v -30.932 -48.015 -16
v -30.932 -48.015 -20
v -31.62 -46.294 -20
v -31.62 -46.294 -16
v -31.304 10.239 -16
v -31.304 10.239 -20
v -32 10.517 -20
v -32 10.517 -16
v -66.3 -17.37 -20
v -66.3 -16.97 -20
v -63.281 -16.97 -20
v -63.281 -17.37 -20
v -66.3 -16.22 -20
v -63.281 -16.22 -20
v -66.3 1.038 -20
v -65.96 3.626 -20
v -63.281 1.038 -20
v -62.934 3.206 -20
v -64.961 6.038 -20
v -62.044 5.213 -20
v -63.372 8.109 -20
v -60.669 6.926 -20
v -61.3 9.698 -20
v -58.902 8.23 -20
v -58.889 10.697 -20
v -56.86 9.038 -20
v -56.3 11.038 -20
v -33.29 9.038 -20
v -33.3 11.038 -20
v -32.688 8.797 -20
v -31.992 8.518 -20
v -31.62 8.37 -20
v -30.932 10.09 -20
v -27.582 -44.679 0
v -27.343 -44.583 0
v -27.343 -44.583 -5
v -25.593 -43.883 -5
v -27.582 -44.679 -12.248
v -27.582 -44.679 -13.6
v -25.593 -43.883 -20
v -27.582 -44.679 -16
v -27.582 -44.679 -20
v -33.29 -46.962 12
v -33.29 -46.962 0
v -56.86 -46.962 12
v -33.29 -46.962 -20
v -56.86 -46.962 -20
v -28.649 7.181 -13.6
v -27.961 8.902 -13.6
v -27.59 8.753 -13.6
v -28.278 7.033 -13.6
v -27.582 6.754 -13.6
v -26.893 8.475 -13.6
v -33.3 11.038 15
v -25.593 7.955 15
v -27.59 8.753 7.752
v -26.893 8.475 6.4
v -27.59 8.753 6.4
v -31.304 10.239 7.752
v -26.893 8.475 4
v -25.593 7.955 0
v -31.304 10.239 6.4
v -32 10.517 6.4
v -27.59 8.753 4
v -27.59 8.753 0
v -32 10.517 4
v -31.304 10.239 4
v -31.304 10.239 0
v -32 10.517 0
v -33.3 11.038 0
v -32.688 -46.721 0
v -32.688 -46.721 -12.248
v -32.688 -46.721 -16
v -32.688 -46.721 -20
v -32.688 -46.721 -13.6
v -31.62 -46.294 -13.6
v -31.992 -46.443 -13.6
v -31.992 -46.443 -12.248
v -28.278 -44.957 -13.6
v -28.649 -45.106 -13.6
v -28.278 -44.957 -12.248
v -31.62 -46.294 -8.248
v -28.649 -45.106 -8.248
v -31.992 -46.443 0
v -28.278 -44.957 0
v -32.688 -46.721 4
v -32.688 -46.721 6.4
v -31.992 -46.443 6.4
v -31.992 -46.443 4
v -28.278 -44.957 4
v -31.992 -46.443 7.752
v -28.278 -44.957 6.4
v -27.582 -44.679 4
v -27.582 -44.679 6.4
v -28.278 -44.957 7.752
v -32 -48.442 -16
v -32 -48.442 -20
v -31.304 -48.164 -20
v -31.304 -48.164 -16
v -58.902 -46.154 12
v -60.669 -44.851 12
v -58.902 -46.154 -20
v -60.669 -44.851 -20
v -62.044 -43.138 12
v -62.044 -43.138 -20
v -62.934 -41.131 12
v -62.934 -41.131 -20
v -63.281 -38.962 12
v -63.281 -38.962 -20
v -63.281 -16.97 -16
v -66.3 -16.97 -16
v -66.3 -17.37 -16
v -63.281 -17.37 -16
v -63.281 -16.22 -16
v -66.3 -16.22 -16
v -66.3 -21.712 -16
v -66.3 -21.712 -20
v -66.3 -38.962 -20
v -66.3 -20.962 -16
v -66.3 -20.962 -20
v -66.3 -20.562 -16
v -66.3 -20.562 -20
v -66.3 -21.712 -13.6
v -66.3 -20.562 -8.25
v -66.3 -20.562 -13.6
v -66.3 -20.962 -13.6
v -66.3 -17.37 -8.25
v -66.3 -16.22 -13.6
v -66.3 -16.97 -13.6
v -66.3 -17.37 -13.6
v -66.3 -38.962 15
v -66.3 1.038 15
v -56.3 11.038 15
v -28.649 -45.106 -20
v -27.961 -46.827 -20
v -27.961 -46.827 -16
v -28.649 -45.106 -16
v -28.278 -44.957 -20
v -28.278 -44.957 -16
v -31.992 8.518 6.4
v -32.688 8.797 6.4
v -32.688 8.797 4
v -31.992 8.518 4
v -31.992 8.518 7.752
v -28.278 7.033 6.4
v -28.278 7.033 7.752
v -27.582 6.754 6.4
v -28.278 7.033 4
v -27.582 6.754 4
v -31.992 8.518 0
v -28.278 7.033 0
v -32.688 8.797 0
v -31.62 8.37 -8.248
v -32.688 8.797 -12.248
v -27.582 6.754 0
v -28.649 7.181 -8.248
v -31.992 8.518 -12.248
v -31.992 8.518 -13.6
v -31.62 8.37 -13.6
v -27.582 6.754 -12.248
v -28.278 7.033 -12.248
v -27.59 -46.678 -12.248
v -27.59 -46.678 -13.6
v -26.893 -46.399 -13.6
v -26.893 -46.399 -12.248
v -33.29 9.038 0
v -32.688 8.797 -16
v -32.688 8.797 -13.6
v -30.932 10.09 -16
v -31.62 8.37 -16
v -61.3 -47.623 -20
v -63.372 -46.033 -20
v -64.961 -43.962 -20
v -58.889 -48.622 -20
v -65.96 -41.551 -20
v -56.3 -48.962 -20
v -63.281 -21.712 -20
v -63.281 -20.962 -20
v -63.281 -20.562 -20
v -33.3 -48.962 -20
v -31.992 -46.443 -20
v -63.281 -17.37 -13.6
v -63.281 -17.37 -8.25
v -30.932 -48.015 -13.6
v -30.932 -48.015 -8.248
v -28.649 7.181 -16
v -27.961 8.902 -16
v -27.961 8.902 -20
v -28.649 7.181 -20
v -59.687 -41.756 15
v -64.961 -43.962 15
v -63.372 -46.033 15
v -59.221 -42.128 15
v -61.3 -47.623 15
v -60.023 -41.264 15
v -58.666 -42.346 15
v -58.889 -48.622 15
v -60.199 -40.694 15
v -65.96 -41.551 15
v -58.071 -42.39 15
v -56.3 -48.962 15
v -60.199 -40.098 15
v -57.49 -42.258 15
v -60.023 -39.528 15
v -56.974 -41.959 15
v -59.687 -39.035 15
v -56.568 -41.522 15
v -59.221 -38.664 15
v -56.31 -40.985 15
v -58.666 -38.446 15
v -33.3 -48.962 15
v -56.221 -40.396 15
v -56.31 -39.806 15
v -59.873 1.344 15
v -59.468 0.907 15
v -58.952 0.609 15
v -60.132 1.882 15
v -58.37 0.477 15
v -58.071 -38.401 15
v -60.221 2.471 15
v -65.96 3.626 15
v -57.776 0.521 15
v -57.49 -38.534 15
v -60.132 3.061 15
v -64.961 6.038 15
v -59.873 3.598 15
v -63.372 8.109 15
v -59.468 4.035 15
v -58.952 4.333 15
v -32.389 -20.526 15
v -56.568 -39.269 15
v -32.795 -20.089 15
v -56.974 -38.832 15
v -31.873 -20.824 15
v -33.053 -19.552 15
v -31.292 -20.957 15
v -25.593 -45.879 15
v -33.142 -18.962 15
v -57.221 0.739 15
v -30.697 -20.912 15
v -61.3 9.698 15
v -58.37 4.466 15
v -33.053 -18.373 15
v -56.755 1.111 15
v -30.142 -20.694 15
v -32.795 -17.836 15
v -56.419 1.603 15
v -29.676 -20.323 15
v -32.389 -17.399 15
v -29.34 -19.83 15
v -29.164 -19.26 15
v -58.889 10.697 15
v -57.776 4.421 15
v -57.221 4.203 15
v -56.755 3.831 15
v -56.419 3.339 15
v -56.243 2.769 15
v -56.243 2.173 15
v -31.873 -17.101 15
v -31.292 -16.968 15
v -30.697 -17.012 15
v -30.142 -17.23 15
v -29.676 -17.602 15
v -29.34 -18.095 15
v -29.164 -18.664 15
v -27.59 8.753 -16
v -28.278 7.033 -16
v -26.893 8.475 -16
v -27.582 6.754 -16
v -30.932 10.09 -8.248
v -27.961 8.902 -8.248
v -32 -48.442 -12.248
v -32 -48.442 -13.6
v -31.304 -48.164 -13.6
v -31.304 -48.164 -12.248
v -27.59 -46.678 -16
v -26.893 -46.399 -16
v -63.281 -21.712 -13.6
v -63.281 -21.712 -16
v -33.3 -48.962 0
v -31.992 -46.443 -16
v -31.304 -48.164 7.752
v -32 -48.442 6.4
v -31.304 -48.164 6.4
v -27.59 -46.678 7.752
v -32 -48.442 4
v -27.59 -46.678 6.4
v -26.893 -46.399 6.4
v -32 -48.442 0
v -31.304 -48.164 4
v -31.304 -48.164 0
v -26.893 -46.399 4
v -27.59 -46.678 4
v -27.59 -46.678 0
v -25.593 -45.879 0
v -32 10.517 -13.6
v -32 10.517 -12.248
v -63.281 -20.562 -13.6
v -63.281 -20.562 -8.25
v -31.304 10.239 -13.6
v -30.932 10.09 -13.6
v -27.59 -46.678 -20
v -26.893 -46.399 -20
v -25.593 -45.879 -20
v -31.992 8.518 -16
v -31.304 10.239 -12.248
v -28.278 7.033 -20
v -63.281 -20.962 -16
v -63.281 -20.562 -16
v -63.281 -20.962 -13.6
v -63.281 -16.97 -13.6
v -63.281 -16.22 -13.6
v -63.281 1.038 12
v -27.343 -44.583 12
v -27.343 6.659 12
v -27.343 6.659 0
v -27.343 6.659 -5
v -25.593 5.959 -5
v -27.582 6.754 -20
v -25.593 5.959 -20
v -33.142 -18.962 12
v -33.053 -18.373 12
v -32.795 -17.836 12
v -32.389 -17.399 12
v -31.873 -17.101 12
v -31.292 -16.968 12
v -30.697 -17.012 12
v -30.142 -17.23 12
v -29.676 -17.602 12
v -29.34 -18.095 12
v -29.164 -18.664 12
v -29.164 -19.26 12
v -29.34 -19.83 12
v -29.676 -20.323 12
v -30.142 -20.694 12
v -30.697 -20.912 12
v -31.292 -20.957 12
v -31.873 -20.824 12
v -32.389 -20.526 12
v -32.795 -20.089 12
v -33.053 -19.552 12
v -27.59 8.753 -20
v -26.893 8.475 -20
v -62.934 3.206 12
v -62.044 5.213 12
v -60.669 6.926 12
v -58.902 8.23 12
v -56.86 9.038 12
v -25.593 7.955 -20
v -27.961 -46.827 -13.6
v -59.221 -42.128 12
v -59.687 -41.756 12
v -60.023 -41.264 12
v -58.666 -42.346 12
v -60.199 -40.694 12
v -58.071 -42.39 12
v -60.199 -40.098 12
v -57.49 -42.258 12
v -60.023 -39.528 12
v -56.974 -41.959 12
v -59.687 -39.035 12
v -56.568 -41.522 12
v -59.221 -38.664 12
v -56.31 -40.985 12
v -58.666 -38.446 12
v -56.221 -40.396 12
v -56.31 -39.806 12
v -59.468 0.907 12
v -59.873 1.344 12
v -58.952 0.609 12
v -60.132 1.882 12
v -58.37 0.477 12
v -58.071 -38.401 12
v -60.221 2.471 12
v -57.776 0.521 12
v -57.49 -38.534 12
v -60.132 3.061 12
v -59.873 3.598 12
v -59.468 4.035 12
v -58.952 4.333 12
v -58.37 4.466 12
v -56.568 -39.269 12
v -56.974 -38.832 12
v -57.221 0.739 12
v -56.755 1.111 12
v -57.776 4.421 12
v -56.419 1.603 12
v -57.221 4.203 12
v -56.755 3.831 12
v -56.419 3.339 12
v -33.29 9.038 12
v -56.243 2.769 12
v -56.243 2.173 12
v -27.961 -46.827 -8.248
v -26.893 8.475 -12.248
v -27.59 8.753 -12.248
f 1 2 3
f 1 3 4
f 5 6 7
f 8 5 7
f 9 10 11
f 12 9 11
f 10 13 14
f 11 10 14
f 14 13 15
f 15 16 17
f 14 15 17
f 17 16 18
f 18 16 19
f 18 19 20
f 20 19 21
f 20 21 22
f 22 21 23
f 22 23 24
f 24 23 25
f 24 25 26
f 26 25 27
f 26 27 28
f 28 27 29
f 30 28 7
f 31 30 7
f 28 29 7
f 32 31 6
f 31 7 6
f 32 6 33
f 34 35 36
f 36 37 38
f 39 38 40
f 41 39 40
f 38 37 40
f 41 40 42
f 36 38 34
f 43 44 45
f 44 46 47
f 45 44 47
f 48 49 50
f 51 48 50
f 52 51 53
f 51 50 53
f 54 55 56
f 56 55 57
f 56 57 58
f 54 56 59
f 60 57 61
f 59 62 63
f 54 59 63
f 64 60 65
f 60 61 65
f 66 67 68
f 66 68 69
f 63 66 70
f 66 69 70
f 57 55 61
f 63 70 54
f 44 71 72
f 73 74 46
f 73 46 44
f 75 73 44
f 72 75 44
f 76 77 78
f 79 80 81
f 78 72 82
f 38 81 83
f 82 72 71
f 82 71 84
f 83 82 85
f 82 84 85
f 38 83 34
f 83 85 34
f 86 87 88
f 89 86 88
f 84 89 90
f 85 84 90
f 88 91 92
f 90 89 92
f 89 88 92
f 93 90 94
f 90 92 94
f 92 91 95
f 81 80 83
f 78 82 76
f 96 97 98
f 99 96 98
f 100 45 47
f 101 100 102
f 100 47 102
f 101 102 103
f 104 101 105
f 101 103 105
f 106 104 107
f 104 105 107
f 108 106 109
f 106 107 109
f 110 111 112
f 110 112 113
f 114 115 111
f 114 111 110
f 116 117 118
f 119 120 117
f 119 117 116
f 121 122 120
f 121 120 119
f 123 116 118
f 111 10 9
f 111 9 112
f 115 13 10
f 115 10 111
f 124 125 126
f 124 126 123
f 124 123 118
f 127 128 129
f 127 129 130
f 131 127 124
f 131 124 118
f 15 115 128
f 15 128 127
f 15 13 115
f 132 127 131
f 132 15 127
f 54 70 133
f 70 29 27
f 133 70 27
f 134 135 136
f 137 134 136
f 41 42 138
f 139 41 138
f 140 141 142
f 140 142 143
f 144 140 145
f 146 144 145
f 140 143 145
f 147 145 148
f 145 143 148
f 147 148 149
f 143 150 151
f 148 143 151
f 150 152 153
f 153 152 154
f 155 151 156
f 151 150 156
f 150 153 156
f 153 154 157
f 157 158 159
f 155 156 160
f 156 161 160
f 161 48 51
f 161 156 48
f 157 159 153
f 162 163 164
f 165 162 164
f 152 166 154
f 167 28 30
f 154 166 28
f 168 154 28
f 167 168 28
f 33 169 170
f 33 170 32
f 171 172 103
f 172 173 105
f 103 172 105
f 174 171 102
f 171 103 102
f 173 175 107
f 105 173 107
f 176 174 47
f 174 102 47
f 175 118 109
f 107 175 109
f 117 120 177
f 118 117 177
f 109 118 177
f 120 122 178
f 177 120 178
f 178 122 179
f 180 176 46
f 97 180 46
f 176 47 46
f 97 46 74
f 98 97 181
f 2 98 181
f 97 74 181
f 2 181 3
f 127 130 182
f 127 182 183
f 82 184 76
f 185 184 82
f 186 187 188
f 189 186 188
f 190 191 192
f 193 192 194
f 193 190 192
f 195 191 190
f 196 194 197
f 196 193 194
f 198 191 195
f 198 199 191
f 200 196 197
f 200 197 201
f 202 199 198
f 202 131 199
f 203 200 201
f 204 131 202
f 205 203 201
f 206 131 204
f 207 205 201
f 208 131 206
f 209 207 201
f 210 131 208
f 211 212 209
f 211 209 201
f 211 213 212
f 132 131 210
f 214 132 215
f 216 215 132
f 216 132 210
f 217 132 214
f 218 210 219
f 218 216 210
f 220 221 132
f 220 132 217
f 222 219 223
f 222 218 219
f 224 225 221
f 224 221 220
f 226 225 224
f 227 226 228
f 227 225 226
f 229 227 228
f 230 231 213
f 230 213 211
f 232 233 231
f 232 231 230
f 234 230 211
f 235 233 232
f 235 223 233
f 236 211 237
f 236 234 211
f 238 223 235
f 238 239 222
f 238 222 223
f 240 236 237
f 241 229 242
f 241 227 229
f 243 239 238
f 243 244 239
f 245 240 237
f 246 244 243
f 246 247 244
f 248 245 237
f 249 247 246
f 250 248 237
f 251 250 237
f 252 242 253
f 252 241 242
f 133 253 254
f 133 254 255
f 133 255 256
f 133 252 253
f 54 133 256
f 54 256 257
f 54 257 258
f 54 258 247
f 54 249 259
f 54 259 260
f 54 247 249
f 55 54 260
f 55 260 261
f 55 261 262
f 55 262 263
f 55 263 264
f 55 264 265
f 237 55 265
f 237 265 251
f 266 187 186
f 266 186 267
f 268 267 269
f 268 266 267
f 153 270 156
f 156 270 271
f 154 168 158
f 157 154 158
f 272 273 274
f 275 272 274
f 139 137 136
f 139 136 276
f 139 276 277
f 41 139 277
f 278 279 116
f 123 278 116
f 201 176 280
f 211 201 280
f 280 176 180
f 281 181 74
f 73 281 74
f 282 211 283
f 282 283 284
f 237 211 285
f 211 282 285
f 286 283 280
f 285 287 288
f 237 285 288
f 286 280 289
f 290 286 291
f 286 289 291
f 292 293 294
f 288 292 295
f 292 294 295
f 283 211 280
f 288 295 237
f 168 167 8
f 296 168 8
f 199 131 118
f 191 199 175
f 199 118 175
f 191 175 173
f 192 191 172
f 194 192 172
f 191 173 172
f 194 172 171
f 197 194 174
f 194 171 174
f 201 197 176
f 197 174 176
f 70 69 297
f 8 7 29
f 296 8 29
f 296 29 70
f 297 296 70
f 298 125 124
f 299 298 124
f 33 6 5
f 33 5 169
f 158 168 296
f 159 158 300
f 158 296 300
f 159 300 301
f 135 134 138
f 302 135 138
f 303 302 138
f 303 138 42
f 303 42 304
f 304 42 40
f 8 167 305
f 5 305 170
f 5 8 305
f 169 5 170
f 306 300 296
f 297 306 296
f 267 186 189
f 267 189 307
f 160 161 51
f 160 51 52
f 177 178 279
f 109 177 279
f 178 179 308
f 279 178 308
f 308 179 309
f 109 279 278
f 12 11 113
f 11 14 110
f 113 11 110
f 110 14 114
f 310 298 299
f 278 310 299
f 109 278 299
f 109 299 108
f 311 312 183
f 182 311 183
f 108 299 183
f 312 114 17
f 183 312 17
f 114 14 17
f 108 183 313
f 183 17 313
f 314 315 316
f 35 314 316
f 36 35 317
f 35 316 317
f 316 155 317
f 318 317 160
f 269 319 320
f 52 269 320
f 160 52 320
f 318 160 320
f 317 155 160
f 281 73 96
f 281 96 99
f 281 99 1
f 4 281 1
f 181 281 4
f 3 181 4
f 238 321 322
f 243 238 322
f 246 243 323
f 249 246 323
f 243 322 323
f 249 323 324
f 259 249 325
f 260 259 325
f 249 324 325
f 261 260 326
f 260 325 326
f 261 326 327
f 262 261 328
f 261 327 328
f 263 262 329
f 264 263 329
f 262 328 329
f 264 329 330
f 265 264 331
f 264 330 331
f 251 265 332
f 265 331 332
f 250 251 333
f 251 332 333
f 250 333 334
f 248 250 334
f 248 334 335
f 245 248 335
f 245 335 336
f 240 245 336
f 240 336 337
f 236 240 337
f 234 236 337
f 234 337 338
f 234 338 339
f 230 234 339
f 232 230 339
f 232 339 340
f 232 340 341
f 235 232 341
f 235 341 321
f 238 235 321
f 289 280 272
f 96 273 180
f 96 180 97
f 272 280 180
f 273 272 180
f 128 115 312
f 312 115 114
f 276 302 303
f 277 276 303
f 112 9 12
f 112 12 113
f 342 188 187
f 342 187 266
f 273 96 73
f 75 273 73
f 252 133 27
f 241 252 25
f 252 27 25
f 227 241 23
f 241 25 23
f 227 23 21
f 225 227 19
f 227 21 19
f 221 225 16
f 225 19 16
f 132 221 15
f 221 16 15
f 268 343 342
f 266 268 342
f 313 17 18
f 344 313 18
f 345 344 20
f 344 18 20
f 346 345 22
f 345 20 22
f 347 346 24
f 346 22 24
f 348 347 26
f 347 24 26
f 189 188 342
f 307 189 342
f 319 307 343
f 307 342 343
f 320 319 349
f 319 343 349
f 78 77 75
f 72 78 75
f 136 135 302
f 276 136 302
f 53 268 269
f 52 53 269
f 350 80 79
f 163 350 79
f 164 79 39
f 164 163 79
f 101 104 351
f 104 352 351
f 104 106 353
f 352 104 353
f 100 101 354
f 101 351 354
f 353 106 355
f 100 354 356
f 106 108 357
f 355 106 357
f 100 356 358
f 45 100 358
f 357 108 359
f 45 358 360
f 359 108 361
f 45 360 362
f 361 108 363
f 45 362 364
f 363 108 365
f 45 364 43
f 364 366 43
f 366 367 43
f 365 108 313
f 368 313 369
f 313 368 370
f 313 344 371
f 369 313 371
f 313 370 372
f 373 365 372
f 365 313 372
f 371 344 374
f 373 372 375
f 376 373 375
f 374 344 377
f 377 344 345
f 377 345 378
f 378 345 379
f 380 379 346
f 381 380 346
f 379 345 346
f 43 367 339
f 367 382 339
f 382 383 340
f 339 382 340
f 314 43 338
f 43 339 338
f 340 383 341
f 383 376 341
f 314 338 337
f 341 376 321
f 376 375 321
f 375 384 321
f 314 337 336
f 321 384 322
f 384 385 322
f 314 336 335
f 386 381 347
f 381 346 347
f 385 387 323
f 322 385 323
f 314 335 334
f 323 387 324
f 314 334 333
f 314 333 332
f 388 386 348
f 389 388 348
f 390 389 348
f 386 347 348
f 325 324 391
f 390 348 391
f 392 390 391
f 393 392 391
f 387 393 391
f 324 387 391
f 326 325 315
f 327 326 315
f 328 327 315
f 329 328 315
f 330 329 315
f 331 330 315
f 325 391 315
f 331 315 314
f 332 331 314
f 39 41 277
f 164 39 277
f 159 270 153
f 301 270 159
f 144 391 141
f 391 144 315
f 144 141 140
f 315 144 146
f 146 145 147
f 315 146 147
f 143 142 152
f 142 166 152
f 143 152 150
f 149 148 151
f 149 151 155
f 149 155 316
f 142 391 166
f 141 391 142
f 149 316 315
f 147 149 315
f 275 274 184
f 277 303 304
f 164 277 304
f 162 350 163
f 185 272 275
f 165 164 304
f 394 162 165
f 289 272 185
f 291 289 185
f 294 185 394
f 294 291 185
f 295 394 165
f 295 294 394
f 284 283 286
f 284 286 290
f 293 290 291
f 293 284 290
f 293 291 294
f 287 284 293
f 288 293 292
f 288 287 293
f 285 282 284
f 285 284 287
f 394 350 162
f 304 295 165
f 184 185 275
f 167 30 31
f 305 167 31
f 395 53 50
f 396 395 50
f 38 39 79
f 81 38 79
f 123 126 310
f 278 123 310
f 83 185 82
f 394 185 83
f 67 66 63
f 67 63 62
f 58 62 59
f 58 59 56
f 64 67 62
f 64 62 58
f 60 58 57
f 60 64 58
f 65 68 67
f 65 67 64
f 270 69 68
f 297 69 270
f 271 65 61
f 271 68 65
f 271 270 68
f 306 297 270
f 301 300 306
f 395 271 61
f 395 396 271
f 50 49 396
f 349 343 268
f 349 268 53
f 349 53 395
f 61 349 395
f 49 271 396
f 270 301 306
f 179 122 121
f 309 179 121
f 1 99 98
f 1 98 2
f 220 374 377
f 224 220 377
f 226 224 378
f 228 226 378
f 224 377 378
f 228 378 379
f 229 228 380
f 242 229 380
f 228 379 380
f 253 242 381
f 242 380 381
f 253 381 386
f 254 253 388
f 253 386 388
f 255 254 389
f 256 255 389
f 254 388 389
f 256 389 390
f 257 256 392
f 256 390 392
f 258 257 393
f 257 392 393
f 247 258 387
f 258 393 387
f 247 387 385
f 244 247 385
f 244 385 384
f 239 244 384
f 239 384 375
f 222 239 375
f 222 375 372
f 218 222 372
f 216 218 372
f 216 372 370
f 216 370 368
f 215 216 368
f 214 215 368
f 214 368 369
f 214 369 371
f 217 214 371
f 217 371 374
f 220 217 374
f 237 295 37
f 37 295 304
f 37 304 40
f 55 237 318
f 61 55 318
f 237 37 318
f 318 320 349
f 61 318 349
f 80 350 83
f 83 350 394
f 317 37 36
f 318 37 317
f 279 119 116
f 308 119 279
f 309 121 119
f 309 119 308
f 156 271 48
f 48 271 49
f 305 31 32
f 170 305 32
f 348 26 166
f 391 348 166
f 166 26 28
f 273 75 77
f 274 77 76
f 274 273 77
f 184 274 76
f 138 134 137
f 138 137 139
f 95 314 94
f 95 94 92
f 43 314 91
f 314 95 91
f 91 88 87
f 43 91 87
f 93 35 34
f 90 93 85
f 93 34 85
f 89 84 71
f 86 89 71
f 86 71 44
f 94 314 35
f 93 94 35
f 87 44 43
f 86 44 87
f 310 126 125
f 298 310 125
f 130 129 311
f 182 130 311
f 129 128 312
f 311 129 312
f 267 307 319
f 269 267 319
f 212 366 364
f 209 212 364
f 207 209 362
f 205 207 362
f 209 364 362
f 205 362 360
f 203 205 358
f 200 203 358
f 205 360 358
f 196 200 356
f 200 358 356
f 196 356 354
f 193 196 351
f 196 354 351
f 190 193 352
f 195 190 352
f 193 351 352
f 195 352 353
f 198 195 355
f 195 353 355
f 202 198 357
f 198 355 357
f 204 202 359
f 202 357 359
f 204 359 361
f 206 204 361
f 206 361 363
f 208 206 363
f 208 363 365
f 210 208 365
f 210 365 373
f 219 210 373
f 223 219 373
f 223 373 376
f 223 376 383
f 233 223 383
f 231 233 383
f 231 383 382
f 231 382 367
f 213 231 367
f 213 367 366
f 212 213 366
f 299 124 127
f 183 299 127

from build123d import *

# Parameters (mm, degrees)
BOSS_EXTRU_1_DEPTH            = 15
BOSS_EXTRU_2_START            = -3
BOSS_EXTRU_2_DEPTH            = 3
ENL_V_MAT_EXTRU_2_DEPTH       = 3
ENL_V_MAT_EXTRU_3_DEPTH       = 13
ESQUISSE8_R                   = 2
ENL_V_MAT_EXTRU_4_DEPTH       = 13
D_PLACER_START                = -20
D_PLACER_LA_FACE1_DEPTH       = 20
D_PLACER_START_2              = -12.248443577
D_PLACER_LA_FACE1_2_OUTLINE_W = 3.019195257
D_PLACER_LA_FACE1_2_OUTLINE_H = 5.492352827
D_PLACER_LA_FACE1_2_DEPTH     = 20
D_PLACER_LA_FACE1_3_OUTLINE_W = 3.019195257
D_PLACER_LA_FACE1_3_OUTLINE_H = 0.75
D_PLACER_LA_FACE1_3_DEPTH     = 4
D_PLACER_START_3              = -13.6
D_PLACER_LA_FACE1_4_OUTLINE_W = 3.019195257
D_PLACER_LA_FACE1_4_OUTLINE_H = 0.75
D_PLACER_LA_FACE1_4_DEPTH     = 1.351556423
D_PLACER_START_4              = -12.25
D_PLACER_LA_FACE1_5_OUTLINE_W = 3.019195257
D_PLACER_LA_FACE1_5_OUTLINE_H = 3.992352827
D_PLACER_LA_FACE1_5_DEPTH     = 0.001556423
ESQUISSE9_W                   = 4
ESQUISSE9_H                   = 4
ENL_V_MAT_EXTRU_5_DEPTH       = 10
ESQUISSE10_W                  = 4
ESQUISSE10_H                  = 4
ENL_V_MAT_EXTRU_6_DEPTH       = 10
ESQUISSE11_W                  = 4
ESQUISSE11_H                  = 3.962828904
ENL_V_MAT_EXTRU_7_DEPTH       = 10
ESQUISSE12_W                  = 0.4
ESQUISSE12_H                  = 5.351556423
ESQUISSE12_H_2                = 4
BOSS_EXTRU_4_DEPTH            = 1.853162708
ESQUISSE13_W                  = 0.4
ESQUISSE13_H                  = 5.351556423
ESQUISSE13_H_2                = 4
BOSS_EXTRU_5_DEPTH            = 1.853162708
ESQUISSE14_W                  = 5.349621474
ESQUISSE14_H                  = 0.4
ESQUISSE14_W_2                = 4
ESQUISSE14_W_3                = 5.35
BOSS_EXTRU_6_DEPTH            = 3.019195257
ESQUISSE16_W                  = 20
ESQUISSE16_H                  = 53.833895408
BOSS_EXTRU_7_DEPTH            = 1.75


# Read off the part's stored shape, not the designer's step: Déplacer la face1
with BuildPart() as part:
    # Esquisse2 → Boss.-Extru.1 (new body)
    with BuildSketch(Plane.XY):
        with BuildLine():
            Line((-33.300436576, 11.037686006), (-56.300436576, 11.037686006))
            ThreePointArc((-56.300436576, 11.037686006), (-63.371504388, 8.108753818), (-66.300436576, 1.037686006))
            Line((-66.300436576, 1.037686006), (-66.300436576, -38.962313994))
            ThreePointArc((-66.300436576, -38.962313994), (-63.371504388, -46.033381806), (-56.300436576, -48.962313994))
            Line((-56.300436576, -48.962313994), (-33.300436576, -48.962313994))
            Line((-33.300436576, -48.962313994), (-25.592805837, -45.879261698))
            Line((-25.592805837, -45.879261698), (-25.592805837, -43.883344379))
            Line((-25.592805837, -43.883344379), (-33.290229876, -46.962313994))
            Line((-33.290229876, -46.962313994), (-43.752587859, -46.962313994))
            Line((-43.752587859, -46.962313994), (-47.201202175, -46.962313994))
            Line((-47.201202175, -46.962313994), (-56.860485242, -46.962313994))
            ThreePointArc((-56.860485242, -46.962313994), (-61.412155775, -44.038827986), (-63.281241319, -38.962313994))
            Line((-63.281241319, -38.962313994), (-63.281241319, -24.376108696))
            Line((-63.281241319, -24.376108696), (-63.281241319, -13.548519292))
            Line((-63.281241319, -13.548519292), (-63.281241319, 1.037686006))
            ThreePointArc((-63.281241319, 1.037686006), (-61.412155775, 6.114199998), (-56.860485242, 9.037686006))
            Line((-56.860485242, 9.037686006), (-47.201202175, 9.037686006))
            Line((-47.201202175, 9.037686006), (-43.752587859, 9.037686006))
            Line((-43.752587859, 9.037686006), (-33.290229876, 9.037686006))
            Line((-33.290229876, 9.037686006), (-25.592805837, 5.958716391))
            Line((-25.592805837, 5.958716391), (-25.592805837, 7.95463371))
            Line((-25.592805837, 7.95463371), (-33.300436576, 11.037686006))
        make_face()
    extrude(amount=BOSS_EXTRU_1_DEPTH)

    # Esquisse4 → Boss.-Extru.2 (add)
    with BuildSketch(Plane.XY.offset(15).offset(BOSS_EXTRU_2_START)):
        with BuildLine():
            Line((-25.592805837, 5.958716391), (-33.290229876, 9.037686006))
            Line((-33.290229876, 9.037686006), (-56.860485242, 9.037686006))
            ThreePointArc((-56.860485242, 9.037686006), (-61.412155775, 6.114199998), (-63.281241319, 1.037686006))
            Line((-63.281241319, 1.037686006), (-63.281241319, -38.962313994))
            ThreePointArc((-63.281241319, -38.962313994), (-61.412155775, -44.038827986), (-56.860485242, -46.962313994))
            Line((-56.860485242, -46.962313994), (-33.290229876, -46.962313994))
            Line((-33.290229876, -46.962313994), (-25.592805837, -43.883344379))
            Line((-25.592805837, -43.883344379), (-25.592805837, 5.958716391))
        make_face()
    extrude(amount=BOSS_EXTRU_2_DEPTH)

    # Esquisse6 → Enlèv. mat.-Extru.2 (cut)
    with BuildSketch(Plane(origin=(-0.787065043, -1.967662607, 0), x_dir=(0.9284766908852589, -0.37139067635410505, 0), z_dir=(0.37139067635410505, 0.9284766908852589, 0))):
        Polygon((-32.867286648, 0), (-32.867286648, -4), (-33.617286648, -4), (-33.617286648, -6.4), (-32.867286648, -6.4), (-32.867286648, -7.751556423), (-28.867286648, -7.751556423), (-28.867286648, -6.4), (-28.117286648, -6.4), (-28.117286648, -4), (-28.867286648, -4), (-28.867286648, 0), align=None)
    enl_v_mat_extru_2 = extrude(amount=-ENL_V_MAT_EXTRU_2_DEPTH, mode=Mode.SUBTRACT)

    # Symétrie1: Enlèv. mat.-Extru.2 across plane
    add(enl_v_mat_extru_2.mirror(Plane(origin=(0, -18.962313994, 0), x_dir=(0, 0, 1), z_dir=(0, -1, 0))), mode=Mode.SUBTRACT)

    # Esquisse7 → Enlèv. mat.-Extru.3 (cut)
    with BuildSketch(Plane.ZY.offset(66.300436576)):
        Polygon((0, -20.962313994), (0, -16.969961167), (4, -16.969961167), (4, -16.219961167), (6.4, -16.219961167), (6.4, -16.969961167), (7.75, -16.969961167), (7.75, -20.962313994), (6.4, -20.962313994), (6.4, -21.712313994), (4, -21.712313994), (4, -20.962313994), align=None)
    extrude(amount=-ENL_V_MAT_EXTRU_3_DEPTH, mode=Mode.SUBTRACT)

    # Esquisse8 → Enlèv. mat.-Extru.4 (cut)
    with BuildSketch(Plane(origin=(0, 0, 12), x_dir=(-1, 0, 0), z_dir=(0, 0, -1))):
        with Locations((58.220840839, 2.471128854)):
            Circle(ESQUISSE8_R)
        with Locations(Location((58.220840839, -40.395756842, 0), (0, 0, 180))):
            Circle(ESQUISSE8_R)
        with Locations((31.142040455, -18.962313994)):
            Circle(ESQUISSE8_R)
    extrude(amount=-ENL_V_MAT_EXTRU_4_DEPTH, mode=Mode.SUBTRACT)

    # Déplacer la face1 outline → Déplacer la face1 (add)
    with BuildSketch(Plane.XY.offset(D_PLACER_START)):
        with BuildLine():
            Line((-32.688179458, -46.721493827), (-33.290229876, -46.962313994))
            Line((-33.290229876, -46.962313994), (-56.860485242, -46.962313994))
            ThreePointArc((-56.860485242, -46.962313994), (-61.412155775, -44.038827986), (-63.281241319, -38.962313994))
            Line((-63.281241319, -38.962313994), (-63.281241319, -21.712313994))
            Line((-63.281241319, -21.712313994), (-66.300436576, -21.712313994))
            Line((-66.300436576, -21.712313994), (-66.300436576, -38.962313994))
            ThreePointArc((-66.300436576, -38.962313994), (-63.371504388, -46.033381806), (-56.300436576, -48.962313994))
            Line((-56.300436576, -48.962313994), (-33.300436576, -48.962313994))
            Line((-33.300436576, -48.962313994), (-31.999932107, -48.442112206))
            Line((-31.999932107, -48.442112206), (-32.688179458, -46.721493827))
        make_face()
        Polygon((-25.592805837, -43.883344379), (-27.581557658, -44.678845107), (-26.893310307, -46.399463486), (-25.592805837, -45.879261698), align=None)
        Polygon((-27.581557658, 6.754217119), (-25.592805837, 5.958716391), (-25.592805837, 7.95463371), (-26.893310307, 8.474835498), align=None)
        with BuildLine():
            Line((-66.300436576, -16.219961167), (-63.281241319, -16.219961167))
            Line((-63.281241319, -16.219961167), (-63.281241319, 1.037686006))
            ThreePointArc((-63.281241319, 1.037686006), (-61.412155775, 6.114199998), (-56.860485242, 9.037686006))
            Line((-56.860485242, 9.037686006), (-33.290229876, 9.037686006))
            Line((-33.290229876, 9.037686006), (-32.688179458, 8.796865839))
            Line((-32.688179458, 8.796865839), (-31.999932107, 10.517484218))
            Line((-31.999932107, 10.517484218), (-33.300436576, 11.037686006))
            Line((-33.300436576, 11.037686006), (-56.300436576, 11.037686006))
            ThreePointArc((-56.300436576, 11.037686006), (-63.371504388, 8.108753818), (-66.300436576, 1.037686006))
            Line((-66.300436576, 1.037686006), (-66.300436576, -16.219961167))
        make_face()
    extrude(amount=D_PLACER_LA_FACE1_DEPTH)

    # D_placer la face1 2 outline → D_placer la face1 2 (add)
    with BuildSketch(Plane.XY.offset(D_PLACER_START_2)):
        Polygon((-32.688179458, -46.721493827), (-31.999932107, -48.442112206), (-26.893310307, -46.399463486), (-27.581557658, -44.678845107), align=None)
        with Locations((-64.790838948, -18.966137581)):
            Rectangle(D_PLACER_LA_FACE1_2_OUTLINE_W, D_PLACER_LA_FACE1_2_OUTLINE_H)
        Polygon((-27.581557658, 6.754217119), (-26.893310307, 8.474835498), (-31.999932107, 10.517484218), (-32.688179458, 8.796865839), align=None)
    extrude(amount=D_PLACER_LA_FACE1_2_DEPTH)

    # D_placer la face1 3 outline → D_placer la face1 3 (add)
    with BuildSketch(Plane.XY.offset(D_PLACER_START)):
        Polygon((-31.99182194, -46.44295082), (-32.688179458, -46.721493827), (-31.999932107, -48.442112206), (-31.303574589, -48.163569199), align=None)
        Polygon((-27.581557658, -44.678845107), (-28.277915177, -44.957388115), (-27.589667825, -46.678006494), (-26.893310307, -46.399463486), align=None)
        with Locations((-64.790838948, -21.337313994)):
            Rectangle(D_PLACER_LA_FACE1_3_OUTLINE_W, D_PLACER_LA_FACE1_3_OUTLINE_H)
        with Locations((-64.790838948, -16.594961167)):
            Rectangle(D_PLACER_LA_FACE1_3_OUTLINE_W, D_PLACER_LA_FACE1_3_OUTLINE_H)
        Polygon((-28.277915177, 7.032760127), (-27.581557658, 6.754217119), (-26.893310307, 8.474835498), (-27.589667825, 8.753378505), align=None)
        Polygon((-32.688179458, 8.796865839), (-31.99182194, 8.518322832), (-31.303574589, 10.238941211), (-31.999932107, 10.517484218), align=None)
    extrude(amount=D_PLACER_LA_FACE1_3_DEPTH)

    # D_placer la face1 4 outline → D_placer la face1 4 (add)
    with BuildSketch(Plane.XY.offset(D_PLACER_START_3)):
        Polygon((-31.99182194, -46.44295082), (-32.688179458, -46.721493827), (-31.999932107, -48.442112206), (-31.303574589, -48.163569199), align=None)
        Polygon((-27.581557658, -44.678845107), (-28.277915177, -44.957388115), (-27.589667825, -46.678006494), (-26.893310307, -46.399463486), align=None)
        with Locations((-64.790838948, -21.337313994)):
            Rectangle(D_PLACER_LA_FACE1_4_OUTLINE_W, D_PLACER_LA_FACE1_4_OUTLINE_H)
        with Locations((-64.790838948, -16.594961167)):
            Rectangle(D_PLACER_LA_FACE1_4_OUTLINE_W, D_PLACER_LA_FACE1_4_OUTLINE_H)
        Polygon((-28.277915177, 7.032760127), (-27.581557658, 6.754217119), (-26.893310307, 8.474835498), (-27.589667825, 8.753378505), align=None)
        Polygon((-32.688179458, 8.796865839), (-31.99182194, 8.518322832), (-31.303574589, 10.238941211), (-31.999932107, 10.517484218), align=None)
    extrude(amount=D_PLACER_LA_FACE1_4_DEPTH)

    # D_placer la face1 5 outline → D_placer la face1 5 (add)
    with BuildSketch(Plane.XY.offset(D_PLACER_START_4)):
        with Locations((-64.790838948, -18.966137581)):
            Rectangle(D_PLACER_LA_FACE1_5_OUTLINE_W, D_PLACER_LA_FACE1_5_OUTLINE_H)
    extrude(amount=D_PLACER_LA_FACE1_5_DEPTH)

    # Esquisse9 → Enlèv. mat.-Extru.5 (cut)
    with BuildSketch(Plane(origin=(12.290392884, -30.72598221, 0), x_dir=(0.928476690885259, 0.3713906763541048, 0), z_dir=(0.3713906763541047, -0.9284766908852589, 0))):
        with Locations((-44.952139887, -10.248443577)):
            Rectangle(ESQUISSE9_W, ESQUISSE9_H)
    extrude(amount=-ENL_V_MAT_EXTRU_5_DEPTH, mode=Mode.SUBTRACT)

    # Esquisse10 → Enlèv. mat.-Extru.6 (cut)
    with BuildSketch(Plane(origin=(-0.787065043, -1.967662607, 0), x_dir=(0.9284766908852589, -0.37139067635410505, 0), z_dir=(0.37139067635410505, 0.9284766908852589, 0))):
        with Locations((-30.867286648, 10.248443577)):
            Rectangle(ESQUISSE10_W, ESQUISSE10_H)
    extrude(amount=-ENL_V_MAT_EXTRU_6_DEPTH, mode=Mode.SUBTRACT)

    # Esquisse11 → Enlèv. mat.-Extru.7 (cut)
    with BuildSketch(Plane.ZY.offset(66.300436576)):
        with Locations((-10.25, -18.980899542)):
            Rectangle(ESQUISSE11_W, ESQUISSE11_H)
    extrude(amount=-ENL_V_MAT_EXTRU_7_DEPTH, mode=Mode.SUBTRACT)

    # Esquisse12 → Boss.-Extru.4 (add)
    with BuildSketch(Plane(origin=(-0.787065043, -1.967662607, 0), x_dir=(0.9284766908852589, -0.37139067635410505, 0), z_dir=(0.37139067635410505, 0.9284766908852589, 0))):
        with Locations((-32.667286648, 10.924221789)):
            Rectangle(ESQUISSE12_W, ESQUISSE12_H)
        with Locations((-32.667286648, 18)):
            Rectangle(ESQUISSE12_W, ESQUISSE12_H_2)
        with Locations((-29.067286648, 18)):
            Rectangle(ESQUISSE12_W, ESQUISSE12_H_2)
        with Locations((-29.067286648, 10.924221789)):
            Rectangle(ESQUISSE12_W, ESQUISSE12_H)
    extrude(amount=-BOSS_EXTRU_4_DEPTH)

    # Esquisse13 → Boss.-Extru.5 (add)
    with BuildSketch(Plane(origin=(12.290392884, -30.72598221, 0), x_dir=(0.928476690885259, 0.3713906763541048, 0), z_dir=(0.3713906763541047, -0.9284766908852589, 0))):
        with Locations((-43.152139887, -10.924221789)):
            Rectangle(ESQUISSE13_W, ESQUISSE13_H)
        with Locations((-46.752139887, -10.924221789)):
            Rectangle(ESQUISSE13_W, ESQUISSE13_H)
        with Locations((-46.752139887, -18)):
            Rectangle(ESQUISSE13_W, ESQUISSE13_H_2)
        with Locations((-43.152139887, -18)):
            Rectangle(ESQUISSE13_W, ESQUISSE13_H_2)
    extrude(amount=-BOSS_EXTRU_5_DEPTH)

    # Esquisse14 → Boss.-Extru.6 (add)
    with BuildSketch(Plane.ZY.offset(66.300436576)):
        with Locations((-10.924810737, -20.762313994)):
            Rectangle(ESQUISSE14_W, ESQUISSE14_H)
        with Locations((-18, -17.169961167)):
            Rectangle(ESQUISSE14_W_2, ESQUISSE14_H)
        with Locations((-18, -20.762313994)):
            Rectangle(ESQUISSE14_W_2, ESQUISSE14_H)
        with Locations((-10.925, -17.169961167)):
            Rectangle(ESQUISSE14_W_3, ESQUISSE14_H)
    extrude(amount=-BOSS_EXTRU_6_DEPTH)

    # Esquisse16 → Boss.-Extru.7 (add)
    with BuildSketch(Plane(origin=(-25.592805837, 0, 0), x_dir=(0, 0, -1), z_dir=(1, 0, 0))):
        with Locations((-5, -18.962313994)):
            Rectangle(ESQUISSE16_W, ESQUISSE16_H)
    extrude(amount=-BOSS_EXTRU_7_DEPTH)


solid = part.part
